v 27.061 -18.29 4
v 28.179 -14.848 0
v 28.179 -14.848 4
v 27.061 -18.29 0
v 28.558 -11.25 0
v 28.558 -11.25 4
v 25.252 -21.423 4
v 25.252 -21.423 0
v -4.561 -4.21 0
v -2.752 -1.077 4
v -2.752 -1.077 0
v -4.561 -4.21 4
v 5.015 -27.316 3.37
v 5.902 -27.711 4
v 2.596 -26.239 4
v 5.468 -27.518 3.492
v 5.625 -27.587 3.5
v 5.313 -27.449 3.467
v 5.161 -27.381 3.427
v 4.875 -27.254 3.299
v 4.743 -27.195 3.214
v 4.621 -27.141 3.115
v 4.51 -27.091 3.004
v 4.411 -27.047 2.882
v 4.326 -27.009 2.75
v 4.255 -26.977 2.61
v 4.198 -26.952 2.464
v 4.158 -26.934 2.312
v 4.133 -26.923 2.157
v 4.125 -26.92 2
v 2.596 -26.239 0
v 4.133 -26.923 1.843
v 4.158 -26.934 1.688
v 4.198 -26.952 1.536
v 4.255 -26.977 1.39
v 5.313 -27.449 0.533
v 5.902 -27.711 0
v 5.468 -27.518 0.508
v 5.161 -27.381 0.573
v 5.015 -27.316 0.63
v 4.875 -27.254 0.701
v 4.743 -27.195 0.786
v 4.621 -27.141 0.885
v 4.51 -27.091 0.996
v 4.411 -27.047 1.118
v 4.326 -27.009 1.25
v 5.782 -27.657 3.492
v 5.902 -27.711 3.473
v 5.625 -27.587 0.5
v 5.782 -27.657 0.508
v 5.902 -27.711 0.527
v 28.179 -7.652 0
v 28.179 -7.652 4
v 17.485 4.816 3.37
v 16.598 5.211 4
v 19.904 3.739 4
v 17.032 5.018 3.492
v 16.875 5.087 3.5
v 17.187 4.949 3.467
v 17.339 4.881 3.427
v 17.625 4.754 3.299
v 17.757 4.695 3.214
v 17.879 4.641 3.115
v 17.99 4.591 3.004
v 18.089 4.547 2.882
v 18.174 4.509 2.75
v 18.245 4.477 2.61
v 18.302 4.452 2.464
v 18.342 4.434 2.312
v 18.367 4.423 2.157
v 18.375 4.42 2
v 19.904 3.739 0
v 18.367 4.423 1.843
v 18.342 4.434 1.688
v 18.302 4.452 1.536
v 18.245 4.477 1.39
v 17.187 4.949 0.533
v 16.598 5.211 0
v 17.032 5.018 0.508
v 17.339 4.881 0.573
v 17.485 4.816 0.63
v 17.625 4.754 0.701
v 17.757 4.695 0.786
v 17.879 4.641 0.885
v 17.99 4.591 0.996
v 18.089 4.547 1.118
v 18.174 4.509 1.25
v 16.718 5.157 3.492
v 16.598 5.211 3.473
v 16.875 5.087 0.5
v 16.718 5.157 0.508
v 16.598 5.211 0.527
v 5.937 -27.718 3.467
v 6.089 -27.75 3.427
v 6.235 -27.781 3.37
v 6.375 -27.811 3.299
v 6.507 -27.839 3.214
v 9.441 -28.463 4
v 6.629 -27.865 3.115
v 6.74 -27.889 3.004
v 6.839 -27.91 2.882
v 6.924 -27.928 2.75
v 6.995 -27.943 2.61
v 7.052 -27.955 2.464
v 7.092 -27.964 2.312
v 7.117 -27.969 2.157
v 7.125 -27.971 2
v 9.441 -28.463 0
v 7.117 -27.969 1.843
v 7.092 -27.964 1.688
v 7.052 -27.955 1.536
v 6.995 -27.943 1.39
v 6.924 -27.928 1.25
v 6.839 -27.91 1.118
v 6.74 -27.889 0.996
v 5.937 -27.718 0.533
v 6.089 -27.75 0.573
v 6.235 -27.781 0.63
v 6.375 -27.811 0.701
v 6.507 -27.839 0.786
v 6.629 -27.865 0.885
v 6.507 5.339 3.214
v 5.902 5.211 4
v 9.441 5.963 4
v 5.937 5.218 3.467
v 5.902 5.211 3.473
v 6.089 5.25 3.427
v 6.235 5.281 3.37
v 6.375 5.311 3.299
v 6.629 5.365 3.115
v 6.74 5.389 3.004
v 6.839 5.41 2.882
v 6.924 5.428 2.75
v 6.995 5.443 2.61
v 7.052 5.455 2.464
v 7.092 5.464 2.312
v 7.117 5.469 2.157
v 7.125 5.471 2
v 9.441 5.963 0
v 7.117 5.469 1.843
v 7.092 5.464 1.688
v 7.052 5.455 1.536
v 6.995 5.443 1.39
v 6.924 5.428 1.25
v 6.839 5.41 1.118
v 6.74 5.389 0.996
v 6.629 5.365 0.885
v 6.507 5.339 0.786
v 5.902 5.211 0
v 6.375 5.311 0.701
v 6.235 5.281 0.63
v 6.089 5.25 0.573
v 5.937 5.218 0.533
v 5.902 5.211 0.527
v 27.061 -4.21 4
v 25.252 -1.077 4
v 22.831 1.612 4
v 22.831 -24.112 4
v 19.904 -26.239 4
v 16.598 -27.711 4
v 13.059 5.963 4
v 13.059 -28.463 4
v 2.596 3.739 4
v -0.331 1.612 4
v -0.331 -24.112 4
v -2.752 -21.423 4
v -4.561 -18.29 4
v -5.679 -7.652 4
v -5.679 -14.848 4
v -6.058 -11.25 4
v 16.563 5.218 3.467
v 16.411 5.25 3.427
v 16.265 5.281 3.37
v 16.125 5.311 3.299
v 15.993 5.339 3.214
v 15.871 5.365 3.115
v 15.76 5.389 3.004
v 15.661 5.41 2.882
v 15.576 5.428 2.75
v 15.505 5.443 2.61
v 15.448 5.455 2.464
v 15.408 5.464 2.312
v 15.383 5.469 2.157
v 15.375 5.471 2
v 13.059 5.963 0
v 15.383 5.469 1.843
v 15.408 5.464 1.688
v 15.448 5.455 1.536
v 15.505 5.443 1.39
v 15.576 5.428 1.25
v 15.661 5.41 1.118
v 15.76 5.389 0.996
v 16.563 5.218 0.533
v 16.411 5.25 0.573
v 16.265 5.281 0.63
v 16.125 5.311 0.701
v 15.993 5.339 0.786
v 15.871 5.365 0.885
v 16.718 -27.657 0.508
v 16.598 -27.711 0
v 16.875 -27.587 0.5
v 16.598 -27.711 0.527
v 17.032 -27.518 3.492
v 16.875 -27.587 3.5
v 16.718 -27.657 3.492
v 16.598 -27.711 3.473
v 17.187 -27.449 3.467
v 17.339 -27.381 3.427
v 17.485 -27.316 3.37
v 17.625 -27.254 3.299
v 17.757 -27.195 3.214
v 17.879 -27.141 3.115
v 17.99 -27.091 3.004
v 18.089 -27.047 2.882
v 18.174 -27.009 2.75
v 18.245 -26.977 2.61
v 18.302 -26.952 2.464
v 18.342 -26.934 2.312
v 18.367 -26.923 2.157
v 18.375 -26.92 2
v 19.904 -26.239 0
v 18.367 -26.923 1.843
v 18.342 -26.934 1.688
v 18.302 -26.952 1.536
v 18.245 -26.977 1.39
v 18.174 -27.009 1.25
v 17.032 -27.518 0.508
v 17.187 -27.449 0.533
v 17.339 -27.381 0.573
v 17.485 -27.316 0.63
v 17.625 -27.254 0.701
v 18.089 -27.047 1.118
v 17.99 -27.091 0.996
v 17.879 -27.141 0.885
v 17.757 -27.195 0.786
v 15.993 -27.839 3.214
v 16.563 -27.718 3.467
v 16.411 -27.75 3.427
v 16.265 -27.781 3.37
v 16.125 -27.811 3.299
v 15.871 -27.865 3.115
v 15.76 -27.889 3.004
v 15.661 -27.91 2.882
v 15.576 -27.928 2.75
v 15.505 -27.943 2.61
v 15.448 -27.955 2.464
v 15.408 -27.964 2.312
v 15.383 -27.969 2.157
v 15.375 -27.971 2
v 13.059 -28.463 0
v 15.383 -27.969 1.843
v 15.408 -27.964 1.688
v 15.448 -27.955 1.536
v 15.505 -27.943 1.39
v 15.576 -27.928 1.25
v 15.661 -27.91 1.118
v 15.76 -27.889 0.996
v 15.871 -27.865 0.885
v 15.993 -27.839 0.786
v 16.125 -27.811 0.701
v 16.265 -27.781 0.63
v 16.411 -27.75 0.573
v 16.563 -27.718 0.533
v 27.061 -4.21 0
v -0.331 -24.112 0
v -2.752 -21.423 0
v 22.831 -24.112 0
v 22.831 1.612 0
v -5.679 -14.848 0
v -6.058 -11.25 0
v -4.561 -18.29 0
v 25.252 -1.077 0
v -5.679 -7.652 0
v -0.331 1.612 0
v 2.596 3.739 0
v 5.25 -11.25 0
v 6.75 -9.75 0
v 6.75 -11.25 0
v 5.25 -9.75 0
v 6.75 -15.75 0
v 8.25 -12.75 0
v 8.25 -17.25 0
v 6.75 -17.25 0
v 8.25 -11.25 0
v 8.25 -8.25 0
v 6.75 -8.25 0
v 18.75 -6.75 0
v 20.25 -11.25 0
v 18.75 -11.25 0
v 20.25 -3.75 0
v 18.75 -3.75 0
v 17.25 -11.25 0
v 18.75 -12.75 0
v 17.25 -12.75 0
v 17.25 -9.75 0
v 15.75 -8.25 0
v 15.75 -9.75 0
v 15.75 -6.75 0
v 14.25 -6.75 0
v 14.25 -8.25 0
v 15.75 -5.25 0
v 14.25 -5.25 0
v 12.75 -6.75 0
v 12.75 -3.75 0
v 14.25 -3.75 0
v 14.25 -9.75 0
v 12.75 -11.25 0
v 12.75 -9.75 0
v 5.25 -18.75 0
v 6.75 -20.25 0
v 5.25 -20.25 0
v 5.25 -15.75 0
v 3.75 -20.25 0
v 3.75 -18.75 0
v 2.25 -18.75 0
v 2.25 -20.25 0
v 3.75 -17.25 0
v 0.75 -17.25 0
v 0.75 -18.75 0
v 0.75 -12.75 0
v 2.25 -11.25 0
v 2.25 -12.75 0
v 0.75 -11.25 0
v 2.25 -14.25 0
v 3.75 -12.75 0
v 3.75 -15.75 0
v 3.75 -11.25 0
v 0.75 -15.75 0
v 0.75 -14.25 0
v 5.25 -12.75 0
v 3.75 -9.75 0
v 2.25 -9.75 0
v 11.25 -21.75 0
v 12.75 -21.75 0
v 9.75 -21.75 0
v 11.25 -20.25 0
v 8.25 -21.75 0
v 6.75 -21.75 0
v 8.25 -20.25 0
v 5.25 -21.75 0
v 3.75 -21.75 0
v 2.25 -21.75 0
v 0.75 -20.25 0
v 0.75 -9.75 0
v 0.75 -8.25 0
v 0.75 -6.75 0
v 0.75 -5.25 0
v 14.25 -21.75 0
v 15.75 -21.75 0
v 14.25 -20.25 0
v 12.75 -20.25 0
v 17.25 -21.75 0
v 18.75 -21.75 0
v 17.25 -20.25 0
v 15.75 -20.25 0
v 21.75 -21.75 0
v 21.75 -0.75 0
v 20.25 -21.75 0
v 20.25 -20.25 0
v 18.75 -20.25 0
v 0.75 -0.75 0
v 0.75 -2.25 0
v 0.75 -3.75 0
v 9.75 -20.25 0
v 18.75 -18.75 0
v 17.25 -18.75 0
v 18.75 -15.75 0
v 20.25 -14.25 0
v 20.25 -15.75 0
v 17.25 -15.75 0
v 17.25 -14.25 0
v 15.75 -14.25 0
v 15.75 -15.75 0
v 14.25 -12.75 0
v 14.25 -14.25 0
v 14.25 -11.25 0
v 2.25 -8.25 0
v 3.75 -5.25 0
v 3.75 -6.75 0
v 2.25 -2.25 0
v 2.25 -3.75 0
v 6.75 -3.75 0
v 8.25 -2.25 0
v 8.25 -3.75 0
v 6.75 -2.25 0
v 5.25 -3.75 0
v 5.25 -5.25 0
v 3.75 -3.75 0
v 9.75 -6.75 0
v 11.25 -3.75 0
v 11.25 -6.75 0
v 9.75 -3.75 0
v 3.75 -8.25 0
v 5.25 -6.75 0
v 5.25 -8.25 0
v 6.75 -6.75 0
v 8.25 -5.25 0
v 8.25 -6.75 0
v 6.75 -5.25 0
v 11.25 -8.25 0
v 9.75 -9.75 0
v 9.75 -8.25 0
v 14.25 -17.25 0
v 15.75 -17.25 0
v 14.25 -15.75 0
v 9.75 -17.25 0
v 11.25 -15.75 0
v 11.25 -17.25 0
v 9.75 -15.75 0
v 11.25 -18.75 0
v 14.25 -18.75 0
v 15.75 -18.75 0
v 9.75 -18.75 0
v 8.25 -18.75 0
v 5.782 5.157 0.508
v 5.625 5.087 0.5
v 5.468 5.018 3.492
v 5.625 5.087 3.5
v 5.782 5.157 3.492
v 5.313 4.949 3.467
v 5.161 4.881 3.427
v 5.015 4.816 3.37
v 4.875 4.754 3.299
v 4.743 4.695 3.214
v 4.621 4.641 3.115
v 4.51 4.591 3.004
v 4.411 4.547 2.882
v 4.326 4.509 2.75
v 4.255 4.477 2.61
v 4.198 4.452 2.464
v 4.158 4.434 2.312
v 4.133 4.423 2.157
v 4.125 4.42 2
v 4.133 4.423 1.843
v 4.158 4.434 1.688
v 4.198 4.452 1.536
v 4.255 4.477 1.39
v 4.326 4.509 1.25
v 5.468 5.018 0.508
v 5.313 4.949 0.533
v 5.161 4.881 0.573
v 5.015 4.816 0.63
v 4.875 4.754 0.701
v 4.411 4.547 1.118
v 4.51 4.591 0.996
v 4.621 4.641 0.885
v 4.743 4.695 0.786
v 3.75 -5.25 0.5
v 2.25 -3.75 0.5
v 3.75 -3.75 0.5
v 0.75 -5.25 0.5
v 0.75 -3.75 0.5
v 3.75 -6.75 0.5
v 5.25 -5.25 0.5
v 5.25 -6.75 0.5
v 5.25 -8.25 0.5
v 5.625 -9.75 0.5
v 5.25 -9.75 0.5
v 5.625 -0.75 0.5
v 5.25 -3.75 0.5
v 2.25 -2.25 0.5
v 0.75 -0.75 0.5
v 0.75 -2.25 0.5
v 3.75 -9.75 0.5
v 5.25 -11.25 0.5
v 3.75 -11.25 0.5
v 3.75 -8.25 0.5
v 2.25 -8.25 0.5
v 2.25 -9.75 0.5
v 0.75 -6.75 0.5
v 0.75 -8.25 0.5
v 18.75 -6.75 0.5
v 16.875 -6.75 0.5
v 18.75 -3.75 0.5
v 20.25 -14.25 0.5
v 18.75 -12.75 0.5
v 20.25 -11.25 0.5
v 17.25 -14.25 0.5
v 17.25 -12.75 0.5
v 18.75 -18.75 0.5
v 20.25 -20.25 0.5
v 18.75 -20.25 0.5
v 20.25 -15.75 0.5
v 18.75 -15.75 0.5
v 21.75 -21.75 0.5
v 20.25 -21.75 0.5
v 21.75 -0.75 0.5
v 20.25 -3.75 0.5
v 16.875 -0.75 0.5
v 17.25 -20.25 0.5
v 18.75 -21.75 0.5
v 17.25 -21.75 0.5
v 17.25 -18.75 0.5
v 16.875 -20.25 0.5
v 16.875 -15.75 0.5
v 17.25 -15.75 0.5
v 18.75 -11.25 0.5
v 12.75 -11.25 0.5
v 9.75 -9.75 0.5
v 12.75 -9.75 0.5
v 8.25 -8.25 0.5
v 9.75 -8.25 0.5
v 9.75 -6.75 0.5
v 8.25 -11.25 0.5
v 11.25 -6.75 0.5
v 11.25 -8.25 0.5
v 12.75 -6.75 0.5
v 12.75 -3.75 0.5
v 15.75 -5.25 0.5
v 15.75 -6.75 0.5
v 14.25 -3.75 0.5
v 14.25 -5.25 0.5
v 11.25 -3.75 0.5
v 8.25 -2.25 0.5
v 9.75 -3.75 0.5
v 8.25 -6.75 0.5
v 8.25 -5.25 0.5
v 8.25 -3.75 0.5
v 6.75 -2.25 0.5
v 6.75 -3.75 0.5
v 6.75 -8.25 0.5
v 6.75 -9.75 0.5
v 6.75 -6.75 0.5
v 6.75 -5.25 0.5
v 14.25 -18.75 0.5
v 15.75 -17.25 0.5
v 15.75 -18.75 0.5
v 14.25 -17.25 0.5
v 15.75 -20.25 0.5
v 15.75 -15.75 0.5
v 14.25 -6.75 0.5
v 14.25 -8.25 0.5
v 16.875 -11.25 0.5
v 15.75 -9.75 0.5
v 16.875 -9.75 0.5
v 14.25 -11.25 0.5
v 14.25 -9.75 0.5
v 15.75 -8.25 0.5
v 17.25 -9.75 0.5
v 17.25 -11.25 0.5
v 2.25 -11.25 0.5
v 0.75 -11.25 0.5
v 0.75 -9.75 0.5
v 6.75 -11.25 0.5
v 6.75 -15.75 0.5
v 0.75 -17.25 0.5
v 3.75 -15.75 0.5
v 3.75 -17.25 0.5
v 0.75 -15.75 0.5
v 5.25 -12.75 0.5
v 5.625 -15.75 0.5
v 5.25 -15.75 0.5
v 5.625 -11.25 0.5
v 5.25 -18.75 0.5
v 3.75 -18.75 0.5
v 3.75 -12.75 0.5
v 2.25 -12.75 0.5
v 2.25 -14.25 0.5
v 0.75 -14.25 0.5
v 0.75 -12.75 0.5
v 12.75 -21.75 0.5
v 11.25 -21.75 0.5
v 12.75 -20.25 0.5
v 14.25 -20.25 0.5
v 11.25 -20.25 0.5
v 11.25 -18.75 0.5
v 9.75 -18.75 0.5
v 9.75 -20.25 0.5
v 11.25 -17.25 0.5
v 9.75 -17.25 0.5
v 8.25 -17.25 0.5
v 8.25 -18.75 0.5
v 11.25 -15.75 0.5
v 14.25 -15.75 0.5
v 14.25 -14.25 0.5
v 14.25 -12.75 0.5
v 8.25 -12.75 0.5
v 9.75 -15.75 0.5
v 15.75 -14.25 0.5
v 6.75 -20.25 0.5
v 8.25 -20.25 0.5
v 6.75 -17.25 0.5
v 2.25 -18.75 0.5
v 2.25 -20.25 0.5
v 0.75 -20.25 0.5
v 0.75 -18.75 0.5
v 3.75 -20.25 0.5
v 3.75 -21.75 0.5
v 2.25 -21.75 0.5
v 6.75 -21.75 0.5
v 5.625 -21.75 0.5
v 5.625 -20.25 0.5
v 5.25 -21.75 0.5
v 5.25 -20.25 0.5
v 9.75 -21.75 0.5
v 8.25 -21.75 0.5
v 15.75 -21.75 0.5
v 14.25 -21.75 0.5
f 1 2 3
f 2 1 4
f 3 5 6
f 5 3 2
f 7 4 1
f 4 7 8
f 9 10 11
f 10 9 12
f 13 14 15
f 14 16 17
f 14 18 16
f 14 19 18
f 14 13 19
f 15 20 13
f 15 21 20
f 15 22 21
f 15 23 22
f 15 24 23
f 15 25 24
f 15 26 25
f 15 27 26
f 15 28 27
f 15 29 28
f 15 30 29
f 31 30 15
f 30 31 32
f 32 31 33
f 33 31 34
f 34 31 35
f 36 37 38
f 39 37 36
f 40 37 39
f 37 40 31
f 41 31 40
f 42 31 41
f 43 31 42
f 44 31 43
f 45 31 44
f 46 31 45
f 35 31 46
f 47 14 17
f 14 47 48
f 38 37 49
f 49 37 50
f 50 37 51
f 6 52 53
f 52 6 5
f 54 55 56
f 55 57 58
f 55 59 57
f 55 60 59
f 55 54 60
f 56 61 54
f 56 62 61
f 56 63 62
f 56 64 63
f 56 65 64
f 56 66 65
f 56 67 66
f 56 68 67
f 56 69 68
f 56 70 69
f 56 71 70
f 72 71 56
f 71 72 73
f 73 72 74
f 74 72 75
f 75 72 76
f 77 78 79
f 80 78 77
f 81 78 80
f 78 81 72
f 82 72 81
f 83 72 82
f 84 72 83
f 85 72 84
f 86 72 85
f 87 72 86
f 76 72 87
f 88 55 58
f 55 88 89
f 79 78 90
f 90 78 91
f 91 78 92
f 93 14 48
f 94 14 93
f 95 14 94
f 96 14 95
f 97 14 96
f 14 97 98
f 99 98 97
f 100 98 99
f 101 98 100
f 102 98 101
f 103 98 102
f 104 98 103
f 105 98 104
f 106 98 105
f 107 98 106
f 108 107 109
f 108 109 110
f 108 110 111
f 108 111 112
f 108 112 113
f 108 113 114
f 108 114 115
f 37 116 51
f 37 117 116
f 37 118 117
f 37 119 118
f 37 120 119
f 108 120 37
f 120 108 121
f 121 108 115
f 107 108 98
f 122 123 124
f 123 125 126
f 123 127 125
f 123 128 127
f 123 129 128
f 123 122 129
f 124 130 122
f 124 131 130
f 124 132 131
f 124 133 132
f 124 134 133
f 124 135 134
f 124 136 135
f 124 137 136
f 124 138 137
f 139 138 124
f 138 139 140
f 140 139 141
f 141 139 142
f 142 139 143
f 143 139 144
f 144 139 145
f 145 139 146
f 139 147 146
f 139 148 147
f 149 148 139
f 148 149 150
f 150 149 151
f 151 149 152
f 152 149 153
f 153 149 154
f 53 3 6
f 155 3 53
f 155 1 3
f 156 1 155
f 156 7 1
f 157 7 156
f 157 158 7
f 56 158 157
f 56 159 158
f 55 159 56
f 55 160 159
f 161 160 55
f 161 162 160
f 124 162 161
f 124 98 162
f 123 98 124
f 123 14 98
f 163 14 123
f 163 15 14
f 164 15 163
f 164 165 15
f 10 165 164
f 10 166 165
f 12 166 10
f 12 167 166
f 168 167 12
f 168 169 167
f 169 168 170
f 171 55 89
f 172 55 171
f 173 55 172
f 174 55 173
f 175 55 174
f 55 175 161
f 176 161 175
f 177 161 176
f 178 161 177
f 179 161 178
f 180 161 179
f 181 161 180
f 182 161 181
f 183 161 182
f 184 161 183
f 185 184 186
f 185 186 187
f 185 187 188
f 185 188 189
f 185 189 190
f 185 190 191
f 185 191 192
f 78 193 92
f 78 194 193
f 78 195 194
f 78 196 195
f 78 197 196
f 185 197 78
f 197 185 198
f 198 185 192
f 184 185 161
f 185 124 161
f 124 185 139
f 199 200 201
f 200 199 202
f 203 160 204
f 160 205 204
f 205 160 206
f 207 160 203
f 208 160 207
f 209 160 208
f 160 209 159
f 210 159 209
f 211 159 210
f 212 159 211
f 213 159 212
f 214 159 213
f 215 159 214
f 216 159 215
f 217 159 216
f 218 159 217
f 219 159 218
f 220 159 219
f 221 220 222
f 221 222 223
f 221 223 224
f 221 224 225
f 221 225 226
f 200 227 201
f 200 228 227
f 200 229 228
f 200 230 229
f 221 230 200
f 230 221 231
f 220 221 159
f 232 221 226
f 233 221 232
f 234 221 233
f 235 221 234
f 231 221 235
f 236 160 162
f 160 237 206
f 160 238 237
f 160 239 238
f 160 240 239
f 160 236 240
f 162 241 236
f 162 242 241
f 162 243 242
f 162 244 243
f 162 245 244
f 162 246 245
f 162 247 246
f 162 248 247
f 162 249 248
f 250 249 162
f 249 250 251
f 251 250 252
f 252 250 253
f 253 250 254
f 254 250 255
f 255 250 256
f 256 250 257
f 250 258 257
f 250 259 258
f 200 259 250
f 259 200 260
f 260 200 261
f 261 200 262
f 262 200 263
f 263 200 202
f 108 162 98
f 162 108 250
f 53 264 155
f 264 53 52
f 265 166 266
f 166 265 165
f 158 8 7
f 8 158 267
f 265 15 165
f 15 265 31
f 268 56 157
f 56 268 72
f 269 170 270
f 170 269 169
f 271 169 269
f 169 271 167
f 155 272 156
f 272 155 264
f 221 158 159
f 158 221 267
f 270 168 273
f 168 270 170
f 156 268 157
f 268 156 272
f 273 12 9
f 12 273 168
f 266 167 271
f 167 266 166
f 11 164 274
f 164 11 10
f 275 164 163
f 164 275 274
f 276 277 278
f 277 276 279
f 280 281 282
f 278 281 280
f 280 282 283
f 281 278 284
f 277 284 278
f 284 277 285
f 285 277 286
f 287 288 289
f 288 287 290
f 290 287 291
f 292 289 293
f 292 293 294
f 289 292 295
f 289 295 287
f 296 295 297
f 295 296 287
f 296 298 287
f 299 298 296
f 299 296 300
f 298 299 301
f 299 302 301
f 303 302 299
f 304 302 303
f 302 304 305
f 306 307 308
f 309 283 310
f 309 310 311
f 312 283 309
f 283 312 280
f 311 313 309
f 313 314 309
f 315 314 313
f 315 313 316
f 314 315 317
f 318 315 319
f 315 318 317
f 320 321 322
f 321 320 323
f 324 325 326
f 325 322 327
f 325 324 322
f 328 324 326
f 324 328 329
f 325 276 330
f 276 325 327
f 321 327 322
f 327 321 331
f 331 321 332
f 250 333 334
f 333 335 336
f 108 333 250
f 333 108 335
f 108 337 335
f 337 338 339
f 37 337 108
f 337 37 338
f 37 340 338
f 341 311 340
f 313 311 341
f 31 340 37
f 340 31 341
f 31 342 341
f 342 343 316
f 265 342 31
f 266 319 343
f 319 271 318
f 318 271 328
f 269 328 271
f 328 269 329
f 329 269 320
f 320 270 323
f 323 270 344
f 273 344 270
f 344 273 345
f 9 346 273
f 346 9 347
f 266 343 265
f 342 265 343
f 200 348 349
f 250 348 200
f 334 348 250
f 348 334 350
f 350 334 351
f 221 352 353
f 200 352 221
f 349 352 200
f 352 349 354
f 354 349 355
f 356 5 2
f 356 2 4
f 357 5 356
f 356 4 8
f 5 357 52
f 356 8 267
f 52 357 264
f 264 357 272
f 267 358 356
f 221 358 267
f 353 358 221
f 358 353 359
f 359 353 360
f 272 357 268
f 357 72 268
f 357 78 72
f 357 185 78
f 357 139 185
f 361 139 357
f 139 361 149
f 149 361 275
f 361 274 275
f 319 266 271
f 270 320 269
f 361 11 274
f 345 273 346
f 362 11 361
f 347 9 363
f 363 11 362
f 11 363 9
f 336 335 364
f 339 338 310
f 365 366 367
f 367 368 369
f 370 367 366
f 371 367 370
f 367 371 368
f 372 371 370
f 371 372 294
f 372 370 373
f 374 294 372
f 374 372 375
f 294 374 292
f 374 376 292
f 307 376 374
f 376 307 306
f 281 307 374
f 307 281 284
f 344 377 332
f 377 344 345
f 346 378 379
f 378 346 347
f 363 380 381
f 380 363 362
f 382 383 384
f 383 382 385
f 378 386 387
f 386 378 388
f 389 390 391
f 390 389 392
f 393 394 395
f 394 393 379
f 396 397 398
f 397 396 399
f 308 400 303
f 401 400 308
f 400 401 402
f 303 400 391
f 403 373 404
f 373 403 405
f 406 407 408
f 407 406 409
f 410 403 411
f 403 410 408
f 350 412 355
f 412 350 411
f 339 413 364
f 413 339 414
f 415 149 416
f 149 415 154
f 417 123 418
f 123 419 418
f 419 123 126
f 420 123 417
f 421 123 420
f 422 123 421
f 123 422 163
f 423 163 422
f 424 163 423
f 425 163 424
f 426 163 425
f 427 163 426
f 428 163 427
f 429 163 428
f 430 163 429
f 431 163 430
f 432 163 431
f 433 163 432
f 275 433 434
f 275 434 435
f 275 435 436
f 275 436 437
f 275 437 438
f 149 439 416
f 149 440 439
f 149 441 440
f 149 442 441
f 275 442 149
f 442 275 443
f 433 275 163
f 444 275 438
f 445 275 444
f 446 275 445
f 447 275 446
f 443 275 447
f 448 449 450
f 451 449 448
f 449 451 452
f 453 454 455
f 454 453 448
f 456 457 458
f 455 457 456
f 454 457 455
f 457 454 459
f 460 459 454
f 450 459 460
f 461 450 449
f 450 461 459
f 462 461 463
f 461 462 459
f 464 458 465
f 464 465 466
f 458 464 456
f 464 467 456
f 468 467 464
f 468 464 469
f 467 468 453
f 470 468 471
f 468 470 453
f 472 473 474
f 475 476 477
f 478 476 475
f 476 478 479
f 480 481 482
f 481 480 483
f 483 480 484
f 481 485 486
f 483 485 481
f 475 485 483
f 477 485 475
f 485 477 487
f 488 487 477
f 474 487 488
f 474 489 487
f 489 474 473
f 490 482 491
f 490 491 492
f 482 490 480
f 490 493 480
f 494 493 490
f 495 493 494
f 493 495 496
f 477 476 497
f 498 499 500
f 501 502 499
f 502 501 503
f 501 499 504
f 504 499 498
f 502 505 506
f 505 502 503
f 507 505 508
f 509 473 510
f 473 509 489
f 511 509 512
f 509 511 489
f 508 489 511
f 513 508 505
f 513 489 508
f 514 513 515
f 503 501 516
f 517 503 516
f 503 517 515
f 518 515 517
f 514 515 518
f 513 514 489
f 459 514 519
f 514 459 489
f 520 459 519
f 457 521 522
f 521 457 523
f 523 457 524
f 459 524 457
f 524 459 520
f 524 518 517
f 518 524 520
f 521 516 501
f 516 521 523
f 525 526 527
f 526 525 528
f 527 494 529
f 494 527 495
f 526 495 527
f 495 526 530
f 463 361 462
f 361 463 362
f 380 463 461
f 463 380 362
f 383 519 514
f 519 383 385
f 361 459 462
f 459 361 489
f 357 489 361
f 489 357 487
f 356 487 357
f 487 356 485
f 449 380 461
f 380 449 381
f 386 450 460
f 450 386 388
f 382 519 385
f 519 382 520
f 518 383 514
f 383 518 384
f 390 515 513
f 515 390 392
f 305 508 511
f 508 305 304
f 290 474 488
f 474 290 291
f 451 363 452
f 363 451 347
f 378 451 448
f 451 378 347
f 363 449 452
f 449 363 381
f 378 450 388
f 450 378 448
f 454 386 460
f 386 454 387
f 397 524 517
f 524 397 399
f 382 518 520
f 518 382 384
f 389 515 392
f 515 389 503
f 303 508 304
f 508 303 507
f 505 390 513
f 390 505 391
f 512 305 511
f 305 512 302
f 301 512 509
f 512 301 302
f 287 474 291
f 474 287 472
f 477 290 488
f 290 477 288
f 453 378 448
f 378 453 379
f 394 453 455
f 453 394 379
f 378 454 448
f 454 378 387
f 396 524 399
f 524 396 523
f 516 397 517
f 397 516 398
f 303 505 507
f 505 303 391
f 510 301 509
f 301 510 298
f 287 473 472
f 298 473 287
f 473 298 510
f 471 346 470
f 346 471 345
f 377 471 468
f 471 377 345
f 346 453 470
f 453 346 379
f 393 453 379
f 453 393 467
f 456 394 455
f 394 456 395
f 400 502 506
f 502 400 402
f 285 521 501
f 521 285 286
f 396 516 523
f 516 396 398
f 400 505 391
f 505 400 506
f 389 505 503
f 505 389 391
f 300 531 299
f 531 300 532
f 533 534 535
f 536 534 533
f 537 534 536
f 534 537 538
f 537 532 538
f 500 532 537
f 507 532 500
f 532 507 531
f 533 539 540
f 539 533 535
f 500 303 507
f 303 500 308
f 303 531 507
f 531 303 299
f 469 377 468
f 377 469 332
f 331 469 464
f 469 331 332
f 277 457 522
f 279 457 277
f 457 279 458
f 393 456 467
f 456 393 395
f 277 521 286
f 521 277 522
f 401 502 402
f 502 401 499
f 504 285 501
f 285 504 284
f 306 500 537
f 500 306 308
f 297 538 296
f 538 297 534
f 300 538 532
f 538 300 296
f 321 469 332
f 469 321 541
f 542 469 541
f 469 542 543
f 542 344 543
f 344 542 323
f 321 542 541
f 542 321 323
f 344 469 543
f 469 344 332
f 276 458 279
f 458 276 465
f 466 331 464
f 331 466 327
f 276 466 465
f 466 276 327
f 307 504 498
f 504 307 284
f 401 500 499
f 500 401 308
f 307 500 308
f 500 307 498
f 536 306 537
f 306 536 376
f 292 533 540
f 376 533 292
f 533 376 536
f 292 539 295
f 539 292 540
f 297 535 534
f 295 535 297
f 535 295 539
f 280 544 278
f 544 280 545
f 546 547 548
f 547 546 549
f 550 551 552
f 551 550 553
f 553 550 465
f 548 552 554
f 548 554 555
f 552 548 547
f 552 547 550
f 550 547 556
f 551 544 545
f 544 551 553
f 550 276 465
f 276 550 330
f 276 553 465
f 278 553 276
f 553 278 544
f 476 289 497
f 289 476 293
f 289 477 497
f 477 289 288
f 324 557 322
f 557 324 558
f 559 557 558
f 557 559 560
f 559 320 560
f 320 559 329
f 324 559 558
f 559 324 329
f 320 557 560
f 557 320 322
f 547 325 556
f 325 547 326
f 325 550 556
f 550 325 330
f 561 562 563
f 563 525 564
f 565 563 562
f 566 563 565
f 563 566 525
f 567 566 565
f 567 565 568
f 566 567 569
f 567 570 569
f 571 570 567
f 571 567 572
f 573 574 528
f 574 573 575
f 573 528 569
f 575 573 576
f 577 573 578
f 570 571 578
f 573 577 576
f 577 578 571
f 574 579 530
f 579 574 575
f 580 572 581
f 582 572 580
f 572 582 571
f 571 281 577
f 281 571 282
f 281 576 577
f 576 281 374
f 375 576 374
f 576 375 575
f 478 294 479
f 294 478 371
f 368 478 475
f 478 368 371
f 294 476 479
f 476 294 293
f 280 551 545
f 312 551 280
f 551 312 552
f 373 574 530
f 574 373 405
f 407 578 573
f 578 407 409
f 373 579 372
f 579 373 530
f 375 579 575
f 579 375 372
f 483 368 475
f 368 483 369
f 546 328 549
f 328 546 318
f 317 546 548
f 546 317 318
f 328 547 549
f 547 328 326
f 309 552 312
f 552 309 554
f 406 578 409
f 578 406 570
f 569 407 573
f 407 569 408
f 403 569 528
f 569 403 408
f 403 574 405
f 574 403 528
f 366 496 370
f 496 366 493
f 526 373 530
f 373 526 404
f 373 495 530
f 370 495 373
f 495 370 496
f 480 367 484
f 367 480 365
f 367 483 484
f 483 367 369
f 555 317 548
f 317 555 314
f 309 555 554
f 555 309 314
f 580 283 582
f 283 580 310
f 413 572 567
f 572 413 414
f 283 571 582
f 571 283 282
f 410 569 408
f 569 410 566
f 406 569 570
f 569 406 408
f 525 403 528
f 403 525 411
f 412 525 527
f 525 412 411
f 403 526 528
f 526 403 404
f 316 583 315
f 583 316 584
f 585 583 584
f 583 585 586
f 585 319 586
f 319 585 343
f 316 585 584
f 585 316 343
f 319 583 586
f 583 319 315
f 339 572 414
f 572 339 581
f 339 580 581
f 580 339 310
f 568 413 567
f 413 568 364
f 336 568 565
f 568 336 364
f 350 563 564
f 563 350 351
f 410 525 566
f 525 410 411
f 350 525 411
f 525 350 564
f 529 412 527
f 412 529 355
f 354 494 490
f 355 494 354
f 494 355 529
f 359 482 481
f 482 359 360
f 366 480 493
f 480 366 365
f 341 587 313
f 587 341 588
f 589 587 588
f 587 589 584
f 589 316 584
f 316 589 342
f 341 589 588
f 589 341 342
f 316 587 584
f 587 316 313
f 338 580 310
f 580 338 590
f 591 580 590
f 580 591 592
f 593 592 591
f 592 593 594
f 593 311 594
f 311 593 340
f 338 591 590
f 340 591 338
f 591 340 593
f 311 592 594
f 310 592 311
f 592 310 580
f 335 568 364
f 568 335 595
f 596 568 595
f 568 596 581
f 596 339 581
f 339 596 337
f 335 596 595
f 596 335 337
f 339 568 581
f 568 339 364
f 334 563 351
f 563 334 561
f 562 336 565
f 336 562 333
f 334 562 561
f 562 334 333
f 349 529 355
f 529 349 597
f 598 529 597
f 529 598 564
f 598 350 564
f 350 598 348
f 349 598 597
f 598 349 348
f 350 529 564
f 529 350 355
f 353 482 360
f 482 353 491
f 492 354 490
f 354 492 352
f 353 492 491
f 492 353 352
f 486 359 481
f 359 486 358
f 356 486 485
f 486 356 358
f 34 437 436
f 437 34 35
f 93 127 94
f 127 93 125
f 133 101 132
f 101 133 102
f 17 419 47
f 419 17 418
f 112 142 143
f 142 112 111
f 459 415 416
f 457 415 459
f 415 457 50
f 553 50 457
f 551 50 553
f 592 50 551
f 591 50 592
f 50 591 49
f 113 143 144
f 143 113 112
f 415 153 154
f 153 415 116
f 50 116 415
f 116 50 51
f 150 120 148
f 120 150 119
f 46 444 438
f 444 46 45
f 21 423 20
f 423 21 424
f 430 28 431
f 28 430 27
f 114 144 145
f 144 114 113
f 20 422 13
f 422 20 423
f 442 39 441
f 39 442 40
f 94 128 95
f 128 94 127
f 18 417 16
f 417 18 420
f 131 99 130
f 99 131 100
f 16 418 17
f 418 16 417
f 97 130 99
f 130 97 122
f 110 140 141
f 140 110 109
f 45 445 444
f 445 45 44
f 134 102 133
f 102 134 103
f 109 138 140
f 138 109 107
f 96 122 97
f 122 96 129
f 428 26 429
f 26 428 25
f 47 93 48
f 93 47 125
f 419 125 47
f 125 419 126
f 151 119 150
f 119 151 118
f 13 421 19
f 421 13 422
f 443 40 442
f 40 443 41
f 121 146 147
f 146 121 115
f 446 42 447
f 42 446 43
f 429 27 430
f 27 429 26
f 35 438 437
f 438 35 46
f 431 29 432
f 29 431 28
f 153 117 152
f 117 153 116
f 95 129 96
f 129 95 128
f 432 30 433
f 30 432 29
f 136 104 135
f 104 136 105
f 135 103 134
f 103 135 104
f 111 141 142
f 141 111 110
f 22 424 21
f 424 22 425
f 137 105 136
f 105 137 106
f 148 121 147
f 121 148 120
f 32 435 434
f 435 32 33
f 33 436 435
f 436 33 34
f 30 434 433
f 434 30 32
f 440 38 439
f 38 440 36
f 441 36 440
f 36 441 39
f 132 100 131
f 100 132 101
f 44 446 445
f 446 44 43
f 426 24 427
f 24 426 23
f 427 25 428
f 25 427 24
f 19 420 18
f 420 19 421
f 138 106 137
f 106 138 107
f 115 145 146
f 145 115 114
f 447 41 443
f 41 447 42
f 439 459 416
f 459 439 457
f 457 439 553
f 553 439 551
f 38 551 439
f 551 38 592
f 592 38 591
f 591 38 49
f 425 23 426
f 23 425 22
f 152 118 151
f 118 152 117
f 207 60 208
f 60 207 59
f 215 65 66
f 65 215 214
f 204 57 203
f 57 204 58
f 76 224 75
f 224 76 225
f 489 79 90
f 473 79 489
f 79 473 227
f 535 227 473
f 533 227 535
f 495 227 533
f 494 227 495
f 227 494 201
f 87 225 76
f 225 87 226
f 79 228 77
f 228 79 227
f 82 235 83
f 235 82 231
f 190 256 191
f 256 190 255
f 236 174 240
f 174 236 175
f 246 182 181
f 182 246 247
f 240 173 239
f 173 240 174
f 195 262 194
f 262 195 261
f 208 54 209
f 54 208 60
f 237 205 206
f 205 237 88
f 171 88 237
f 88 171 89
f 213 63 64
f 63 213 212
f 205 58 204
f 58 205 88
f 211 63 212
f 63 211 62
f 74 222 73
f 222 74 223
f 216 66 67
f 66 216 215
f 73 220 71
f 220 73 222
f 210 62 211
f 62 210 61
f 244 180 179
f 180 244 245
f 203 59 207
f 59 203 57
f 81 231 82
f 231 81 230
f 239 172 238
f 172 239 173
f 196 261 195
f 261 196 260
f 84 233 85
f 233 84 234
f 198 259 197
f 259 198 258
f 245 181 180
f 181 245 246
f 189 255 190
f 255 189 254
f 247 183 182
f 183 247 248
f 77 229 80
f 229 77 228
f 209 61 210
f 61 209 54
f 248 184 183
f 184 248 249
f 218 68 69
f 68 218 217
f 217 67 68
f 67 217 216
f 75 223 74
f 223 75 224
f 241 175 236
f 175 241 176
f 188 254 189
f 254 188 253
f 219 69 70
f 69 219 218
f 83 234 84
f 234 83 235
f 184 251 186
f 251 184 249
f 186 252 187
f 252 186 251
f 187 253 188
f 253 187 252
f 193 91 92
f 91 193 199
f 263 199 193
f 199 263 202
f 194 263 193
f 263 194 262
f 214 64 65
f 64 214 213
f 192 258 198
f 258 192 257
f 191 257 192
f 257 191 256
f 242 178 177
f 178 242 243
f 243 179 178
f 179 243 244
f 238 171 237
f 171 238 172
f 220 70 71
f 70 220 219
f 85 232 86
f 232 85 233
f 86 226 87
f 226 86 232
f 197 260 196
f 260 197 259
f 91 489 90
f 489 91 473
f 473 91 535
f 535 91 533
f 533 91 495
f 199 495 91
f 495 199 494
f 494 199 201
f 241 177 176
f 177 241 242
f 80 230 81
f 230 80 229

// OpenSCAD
rotate([180,0,0])difference(){translate([11.25,11.25,-2])  cylinder(r=17.3076923076923,h=4, center=true);
translate([1.5,1.5,0])  cube(size = [1.5,1.5,1], center=true);
translate([3,1.5,0])  cube(size = [1.5,1.5,1], center=true);
translate([4.5,1.5,0])  cube(size = [1.5,1.5,1], center=true);
translate([6,1.5,0])  cube(size = [1.5,1.5,1], center=true);
translate([7.5,1.5,0])  cube(size = [1.5,1.5,1], center=true);
translate([9,1.5,0])  cube(size = [1.5,1.5,1], center=true);
translate([10.5,1.5,0])  cube(size = [1.5,1.5,1], center=true);
translate([12,1.5,0])  cube(size = [1.5,1.5,1], center=true);
translate([13.5,1.5,0])  cube(size = [1.5,1.5,1], center=true);
translate([15,1.5,0])  cube(size = [1.5,1.5,1], center=true);
translate([16.5,1.5,0])  cube(size = [1.5,1.5,1], center=true);
translate([18,1.5,0])  cube(size = [1.5,1.5,1], center=true);
translate([19.5,1.5,0])  cube(size = [1.5,1.5,1], center=true);
translate([21,1.5,0])  cube(size = [1.5,1.5,1], center=true);
translate([21,1.5,0])  cube(size = [1.5,1.5,1], center=true);
translate([3,3,0])  cube(size = [1.5,1.5,1], center=true);
translate([4.5,3,0])  cube(size = [1.5,1.5,1], center=true);
translate([6,3,0])  cube(size = [1.5,1.5,1], center=true);
translate([6,3,0])  cube(size = [1.5,1.5,1], center=true);
translate([9,3,0])  cube(size = [1.5,1.5,1], center=true);
translate([10.5,3,0])  cube(size = [1.5,1.5,1], center=true);
translate([12,3,0])  cube(size = [1.5,1.5,1], center=true);
translate([13.5,3,0])  cube(size = [1.5,1.5,1], center=true);
translate([15,3,0])  cube(size = [1.5,1.5,1], center=true);
translate([16.5,3,0])  cube(size = [1.5,1.5,1], center=true);
translate([18,3,0])  cube(size = [1.5,1.5,1], center=true);
translate([19.5,3,0])  cube(size = [1.5,1.5,1], center=true);
translate([21,3,0])  cube(size = [1.5,1.5,1], center=true);
translate([1.5,4.5,0])  cube(size = [1.5,1.5,1], center=true);
translate([3,4.5,0])  cube(size = [1.5,1.5,1], center=true);
translate([3,4.5,0])  cube(size = [1.5,1.5,1], center=true);
translate([6,4.5,0])  cube(size = [1.5,1.5,1], center=true);
translate([7.5,4.5,0])  cube(size = [1.5,1.5,1], center=true);
translate([9,4.5,0])  cube(size = [1.5,1.5,1], center=true);
translate([9,4.5,0])  cube(size = [1.5,1.5,1], center=true);
translate([12,4.5,0])  cube(size = [1.5,1.5,1], center=true);
translate([12,4.5,0])  cube(size = [1.5,1.5,1], center=true);
translate([15,4.5,0])  cube(size = [1.5,1.5,1], center=true);
translate([16.5,4.5,0])  cube(size = [1.5,1.5,1], center=true);
translate([18,4.5,0])  cube(size = [1.5,1.5,1], center=true);
translate([18,4.5,0])  cube(size = [1.5,1.5,1], center=true);
translate([21,4.5,0])  cube(size = [1.5,1.5,1], center=true);
translate([21,4.5,0])  cube(size = [1.5,1.5,1], center=true);
translate([21,4.5,0])  cube(size = [1.5,1.5,1], center=true);
translate([4.5,6,0])  cube(size = [1.5,1.5,1], center=true);
translate([6,6,0])  cube(size = [1.5,1.5,1], center=true);
translate([6,6,0])  cube(size = [1.5,1.5,1], center=true);
translate([9,6,0])  cube(size = [1.5,1.5,1], center=true);
translate([9,6,0])  cube(size = [1.5,1.5,1], center=true);
translate([12,6,0])  cube(size = [1.5,1.5,1], center=true);
translate([12,6,0])  cube(size = [1.5,1.5,1], center=true);
translate([12,6,0])  cube(size = [1.5,1.5,1], center=true);
translate([16.5,6,0])  cube(size = [1.5,1.5,1], center=true);
translate([18,6,0])  cube(size = [1.5,1.5,1], center=true);
translate([18,6,0])  cube(size = [1.5,1.5,1], center=true);
translate([21,6,0])  cube(size = [1.5,1.5,1], center=true);
translate([1.5,7.5,0])  cube(size = [1.5,1.5,1], center=true);
translate([3,7.5,0])  cube(size = [1.5,1.5,1], center=true);
translate([3,7.5,0])  cube(size = [1.5,1.5,1], center=true);
translate([6,7.5,0])  cube(size = [1.5,1.5,1], center=true);
translate([7.5,7.5,0])  cube(size = [1.5,1.5,1], center=true);
translate([9,7.5,0])  cube(size = [1.5,1.5,1], center=true);
translate([10.5,7.5,0])  cube(size = [1.5,1.5,1], center=true);
translate([10.5,7.5,0])  cube(size = [1.5,1.5,1], center=true);
translate([13.5,7.5,0])  cube(size = [1.5,1.5,1], center=true);
translate([13.5,7.5,0])  cube(size = [1.5,1.5,1], center=true);
translate([13.5,7.5,0])  cube(size = [1.5,1.5,1], center=true);
translate([13.5,7.5,0])  cube(size = [1.5,1.5,1], center=true);
translate([13.5,7.5,0])  cube(size = [1.5,1.5,1], center=true);
translate([21,7.5,0])  cube(size = [1.5,1.5,1], center=true);
translate([21,7.5,0])  cube(size = [1.5,1.5,1], center=true);
translate([3,9,0])  cube(size = [1.5,1.5,1], center=true);
translate([4.5,9,0])  cube(size = [1.5,1.5,1], center=true);
translate([6,9,0])  cube(size = [1.5,1.5,1], center=true);
translate([6,9,0])  cube(size = [1.5,1.5,1], center=true);
translate([9,9,0])  cube(size = [1.5,1.5,1], center=true);
translate([9,9,0])  cube(size = [1.5,1.5,1], center=true);
translate([9,9,0])  cube(size = [1.5,1.5,1], center=true);
translate([13.5,9,0])  cube(size = [1.5,1.5,1], center=true);
translate([15,9,0])  cube(size = [1.5,1.5,1], center=true);
translate([15,9,0])  cube(size = [1.5,1.5,1], center=true);
translate([15,9,0])  cube(size = [1.5,1.5,1], center=true);
translate([15,9,0])  cube(size = [1.5,1.5,1], center=true);
translate([21,9,0])  cube(size = [1.5,1.5,1], center=true);
translate([1.5,10.5,0])  cube(size = [1.5,1.5,1], center=true);
translate([1.5,10.5,0])  cube(size = [1.5,1.5,1], center=true);
translate([4.5,10.5,0])  cube(size = [1.5,1.5,1], center=true);
translate([4.5,10.5,0])  cube(size = [1.5,1.5,1], center=true);
translate([4.5,10.5,0])  cube(size = [1.5,1.5,1], center=true);
translate([9,10.5,0])  cube(size = [1.5,1.5,1], center=true);
translate([10.5,10.5,0])  cube(size = [1.5,1.5,1], center=true);
translate([12,10.5,0])  cube(size = [1.5,1.5,1], center=true);
translate([12,10.5,0])  cube(size = [1.5,1.5,1], center=true);
translate([15,10.5,0])  cube(size = [1.5,1.5,1], center=true);
translate([16.5,10.5,0])  cube(size = [1.5,1.5,1], center=true);
translate([16.5,10.5,0])  cube(size = [1.5,1.5,1], center=true);
translate([16.5,10.5,0])  cube(size = [1.5,1.5,1], center=true);
translate([21,10.5,0])  cube(size = [1.5,1.5,1], center=true);
translate([21,10.5,0])  cube(size = [1.5,1.5,1], center=true);
translate([21,10.5,0])  cube(size = [1.5,1.5,1], center=true);
translate([21,10.5,0])  cube(size = [1.5,1.5,1], center=true);
translate([6,12,0])  cube(size = [1.5,1.5,1], center=true);
translate([6,12,0])  cube(size = [1.5,1.5,1], center=true);
translate([6,12,0])  cube(size = [1.5,1.5,1], center=true);
translate([6,12,0])  cube(size = [1.5,1.5,1], center=true);
translate([6,12,0])  cube(size = [1.5,1.5,1], center=true);
translate([6,12,0])  cube(size = [1.5,1.5,1], center=true);
translate([6,12,0])  cube(size = [1.5,1.5,1], center=true);
translate([6,12,0])  cube(size = [1.5,1.5,1], center=true);
translate([6,12,0])  cube(size = [1.5,1.5,1], center=true);
translate([19.5,12,0])  cube(size = [1.5,1.5,1], center=true);
translate([21,12,0])  cube(size = [1.5,1.5,1], center=true);
translate([1.5,13.5,0])  cube(size = [1.5,1.5,1], center=true);
translate([1.5,13.5,0])  cube(size = [1.5,1.5,1], center=true);
translate([4.5,13.5,0])  cube(size = [1.5,1.5,1], center=true);
translate([6,13.5,0])  cube(size = [1.5,1.5,1], center=true);
translate([6,13.5,0])  cube(size = [1.5,1.5,1], center=true);
translate([9,13.5,0])  cube(size = [1.5,1.5,1], center=true);
translate([10.5,13.5,0])  cube(size = [1.5,1.5,1], center=true);
translate([12,13.5,0])  cube(size = [1.5,1.5,1], center=true);
translate([13.5,13.5,0])  cube(size = [1.5,1.5,1], center=true);
translate([13.5,13.5,0])  cube(size = [1.5,1.5,1], center=true);
translate([13.5,13.5,0])  cube(size = [1.5,1.5,1], center=true);
translate([18,13.5,0])  cube(size = [1.5,1.5,1], center=true);
translate([19.5,13.5,0])  cube(size = [1.5,1.5,1], center=true);
translate([21,13.5,0])  cube(size = [1.5,1.5,1], center=true);
translate([21,13.5,0])  cube(size = [1.5,1.5,1], center=true);
translate([21,13.5,0])  cube(size = [1.5,1.5,1], center=true);
translate([4.5,15,0])  cube(size = [1.5,1.5,1], center=true);
translate([6,15,0])  cube(size = [1.5,1.5,1], center=true);
translate([6,15,0])  cube(size = [1.5,1.5,1], center=true);
translate([9,15,0])  cube(size = [1.5,1.5,1], center=true);
translate([10.5,15,0])  cube(size = [1.5,1.5,1], center=true);
translate([12,15,0])  cube(size = [1.5,1.5,1], center=true);
translate([13.5,15,0])  cube(size = [1.5,1.5,1], center=true);
translate([15,15,0])  cube(size = [1.5,1.5,1], center=true);
translate([15,15,0])  cube(size = [1.5,1.5,1], center=true);
translate([15,15,0])  cube(size = [1.5,1.5,1], center=true);
translate([15,15,0])  cube(size = [1.5,1.5,1], center=true);
translate([21,15,0])  cube(size = [1.5,1.5,1], center=true);
translate([1.5,16.5,0])  cube(size = [1.5,1.5,1], center=true);
translate([3,16.5,0])  cube(size = [1.5,1.5,1], center=true);
translate([4.5,16.5,0])  cube(size = [1.5,1.5,1], center=true);
translate([4.5,16.5,0])  cube(size = [1.5,1.5,1], center=true);
translate([4.5,16.5,0])  cube(size = [1.5,1.5,1], center=true);
translate([9,16.5,0])  cube(size = [1.5,1.5,1], center=true);
translate([9,16.5,0])  cube(size = [1.5,1.5,1], center=true);
translate([12,16.5,0])  cube(size = [1.5,1.5,1], center=true);
translate([13.5,16.5,0])  cube(size = [1.5,1.5,1], center=true);
translate([13.5,16.5,0])  cube(size = [1.5,1.5,1], center=true);
translate([16.5,16.5,0])  cube(size = [1.5,1.5,1], center=true);
translate([16.5,16.5,0])  cube(size = [1.5,1.5,1], center=true);
translate([19.5,16.5,0])  cube(size = [1.5,1.5,1], center=true);
translate([21,16.5,0])  cube(size = [1.5,1.5,1], center=true);
translate([21,16.5,0])  cube(size = [1.5,1.5,1], center=true);
translate([21,16.5,0])  cube(size = [1.5,1.5,1], center=true);
translate([4.5,18,0])  cube(size = [1.5,1.5,1], center=true);
translate([4.5,18,0])  cube(size = [1.5,1.5,1], center=true);
translate([7.5,18,0])  cube(size = [1.5,1.5,1], center=true);
translate([9,18,0])  cube(size = [1.5,1.5,1], center=true);
translate([10.5,18,0])  cube(size = [1.5,1.5,1], center=true);
translate([10.5,18,0])  cube(size = [1.5,1.5,1], center=true);
translate([10.5,18,0])  cube(size = [1.5,1.5,1], center=true);
translate([15,18,0])  cube(size = [1.5,1.5,1], center=true);
translate([16.5,18,0])  cube(size = [1.5,1.5,1], center=true);
translate([16.5,18,0])  cube(size = [1.5,1.5,1], center=true);
translate([19.5,18,0])  cube(size = [1.5,1.5,1], center=true);
translate([21,18,0])  cube(size = [1.5,1.5,1], center=true);
translate([1.5,19.5,0])  cube(size = [1.5,1.5,1], center=true);
translate([1.5,19.5,0])  cube(size = [1.5,1.5,1], center=true);
translate([1.5,19.5,0])  cube(size = [1.5,1.5,1], center=true);
translate([1.5,19.5,0])  cube(size = [1.5,1.5,1], center=true);
translate([7.5,19.5,0])  cube(size = [1.5,1.5,1], center=true);
translate([7.5,19.5,0])  cube(size = [1.5,1.5,1], center=true);
translate([10.5,19.5,0])  cube(size = [1.5,1.5,1], center=true);
translate([12,19.5,0])  cube(size = [1.5,1.5,1], center=true);
translate([13.5,19.5,0])  cube(size = [1.5,1.5,1], center=true);
translate([13.5,19.5,0])  cube(size = [1.5,1.5,1], center=true);
translate([16.5,19.5,0])  cube(size = [1.5,1.5,1], center=true);
translate([18,19.5,0])  cube(size = [1.5,1.5,1], center=true);
translate([19.5,19.5,0])  cube(size = [1.5,1.5,1], center=true);
translate([21,19.5,0])  cube(size = [1.5,1.5,1], center=true);
translate([21,19.5,0])  cube(size = [1.5,1.5,1], center=true);
translate([3,21,0])  cube(size = [1.5,1.5,1], center=true);
translate([3,21,0])  cube(size = [1.5,1.5,1], center=true);
translate([6,21,0])  cube(size = [1.5,1.5,1], center=true);
translate([6,21,0])  cube(size = [1.5,1.5,1], center=true);
translate([9,21,0])  cube(size = [1.5,1.5,1], center=true);
translate([9,21,0])  cube(size = [1.5,1.5,1], center=true);
translate([12,21,0])  cube(size = [1.5,1.5,1], center=true);
translate([12,21,0])  cube(size = [1.5,1.5,1], center=true);
translate([15,21,0])  cube(size = [1.5,1.5,1], center=true);
translate([15,21,0])  cube(size = [1.5,1.5,1], center=true);
translate([18,21,0])  cube(size = [1.5,1.5,1], center=true);
translate([18,21,0])  cube(size = [1.5,1.5,1], center=true);
translate([21,21,0])  cube(size = [1.5,1.5,1], center=true);
rotate([90,90,0])translate([2,5.625,0])  cylinder(r=1.5,h=400, $fn=60, center=true);
rotate([90,90,0])translate([2,16.875,0])  cylinder(r=1.5,h=400, $fn=60, center=true);
}
